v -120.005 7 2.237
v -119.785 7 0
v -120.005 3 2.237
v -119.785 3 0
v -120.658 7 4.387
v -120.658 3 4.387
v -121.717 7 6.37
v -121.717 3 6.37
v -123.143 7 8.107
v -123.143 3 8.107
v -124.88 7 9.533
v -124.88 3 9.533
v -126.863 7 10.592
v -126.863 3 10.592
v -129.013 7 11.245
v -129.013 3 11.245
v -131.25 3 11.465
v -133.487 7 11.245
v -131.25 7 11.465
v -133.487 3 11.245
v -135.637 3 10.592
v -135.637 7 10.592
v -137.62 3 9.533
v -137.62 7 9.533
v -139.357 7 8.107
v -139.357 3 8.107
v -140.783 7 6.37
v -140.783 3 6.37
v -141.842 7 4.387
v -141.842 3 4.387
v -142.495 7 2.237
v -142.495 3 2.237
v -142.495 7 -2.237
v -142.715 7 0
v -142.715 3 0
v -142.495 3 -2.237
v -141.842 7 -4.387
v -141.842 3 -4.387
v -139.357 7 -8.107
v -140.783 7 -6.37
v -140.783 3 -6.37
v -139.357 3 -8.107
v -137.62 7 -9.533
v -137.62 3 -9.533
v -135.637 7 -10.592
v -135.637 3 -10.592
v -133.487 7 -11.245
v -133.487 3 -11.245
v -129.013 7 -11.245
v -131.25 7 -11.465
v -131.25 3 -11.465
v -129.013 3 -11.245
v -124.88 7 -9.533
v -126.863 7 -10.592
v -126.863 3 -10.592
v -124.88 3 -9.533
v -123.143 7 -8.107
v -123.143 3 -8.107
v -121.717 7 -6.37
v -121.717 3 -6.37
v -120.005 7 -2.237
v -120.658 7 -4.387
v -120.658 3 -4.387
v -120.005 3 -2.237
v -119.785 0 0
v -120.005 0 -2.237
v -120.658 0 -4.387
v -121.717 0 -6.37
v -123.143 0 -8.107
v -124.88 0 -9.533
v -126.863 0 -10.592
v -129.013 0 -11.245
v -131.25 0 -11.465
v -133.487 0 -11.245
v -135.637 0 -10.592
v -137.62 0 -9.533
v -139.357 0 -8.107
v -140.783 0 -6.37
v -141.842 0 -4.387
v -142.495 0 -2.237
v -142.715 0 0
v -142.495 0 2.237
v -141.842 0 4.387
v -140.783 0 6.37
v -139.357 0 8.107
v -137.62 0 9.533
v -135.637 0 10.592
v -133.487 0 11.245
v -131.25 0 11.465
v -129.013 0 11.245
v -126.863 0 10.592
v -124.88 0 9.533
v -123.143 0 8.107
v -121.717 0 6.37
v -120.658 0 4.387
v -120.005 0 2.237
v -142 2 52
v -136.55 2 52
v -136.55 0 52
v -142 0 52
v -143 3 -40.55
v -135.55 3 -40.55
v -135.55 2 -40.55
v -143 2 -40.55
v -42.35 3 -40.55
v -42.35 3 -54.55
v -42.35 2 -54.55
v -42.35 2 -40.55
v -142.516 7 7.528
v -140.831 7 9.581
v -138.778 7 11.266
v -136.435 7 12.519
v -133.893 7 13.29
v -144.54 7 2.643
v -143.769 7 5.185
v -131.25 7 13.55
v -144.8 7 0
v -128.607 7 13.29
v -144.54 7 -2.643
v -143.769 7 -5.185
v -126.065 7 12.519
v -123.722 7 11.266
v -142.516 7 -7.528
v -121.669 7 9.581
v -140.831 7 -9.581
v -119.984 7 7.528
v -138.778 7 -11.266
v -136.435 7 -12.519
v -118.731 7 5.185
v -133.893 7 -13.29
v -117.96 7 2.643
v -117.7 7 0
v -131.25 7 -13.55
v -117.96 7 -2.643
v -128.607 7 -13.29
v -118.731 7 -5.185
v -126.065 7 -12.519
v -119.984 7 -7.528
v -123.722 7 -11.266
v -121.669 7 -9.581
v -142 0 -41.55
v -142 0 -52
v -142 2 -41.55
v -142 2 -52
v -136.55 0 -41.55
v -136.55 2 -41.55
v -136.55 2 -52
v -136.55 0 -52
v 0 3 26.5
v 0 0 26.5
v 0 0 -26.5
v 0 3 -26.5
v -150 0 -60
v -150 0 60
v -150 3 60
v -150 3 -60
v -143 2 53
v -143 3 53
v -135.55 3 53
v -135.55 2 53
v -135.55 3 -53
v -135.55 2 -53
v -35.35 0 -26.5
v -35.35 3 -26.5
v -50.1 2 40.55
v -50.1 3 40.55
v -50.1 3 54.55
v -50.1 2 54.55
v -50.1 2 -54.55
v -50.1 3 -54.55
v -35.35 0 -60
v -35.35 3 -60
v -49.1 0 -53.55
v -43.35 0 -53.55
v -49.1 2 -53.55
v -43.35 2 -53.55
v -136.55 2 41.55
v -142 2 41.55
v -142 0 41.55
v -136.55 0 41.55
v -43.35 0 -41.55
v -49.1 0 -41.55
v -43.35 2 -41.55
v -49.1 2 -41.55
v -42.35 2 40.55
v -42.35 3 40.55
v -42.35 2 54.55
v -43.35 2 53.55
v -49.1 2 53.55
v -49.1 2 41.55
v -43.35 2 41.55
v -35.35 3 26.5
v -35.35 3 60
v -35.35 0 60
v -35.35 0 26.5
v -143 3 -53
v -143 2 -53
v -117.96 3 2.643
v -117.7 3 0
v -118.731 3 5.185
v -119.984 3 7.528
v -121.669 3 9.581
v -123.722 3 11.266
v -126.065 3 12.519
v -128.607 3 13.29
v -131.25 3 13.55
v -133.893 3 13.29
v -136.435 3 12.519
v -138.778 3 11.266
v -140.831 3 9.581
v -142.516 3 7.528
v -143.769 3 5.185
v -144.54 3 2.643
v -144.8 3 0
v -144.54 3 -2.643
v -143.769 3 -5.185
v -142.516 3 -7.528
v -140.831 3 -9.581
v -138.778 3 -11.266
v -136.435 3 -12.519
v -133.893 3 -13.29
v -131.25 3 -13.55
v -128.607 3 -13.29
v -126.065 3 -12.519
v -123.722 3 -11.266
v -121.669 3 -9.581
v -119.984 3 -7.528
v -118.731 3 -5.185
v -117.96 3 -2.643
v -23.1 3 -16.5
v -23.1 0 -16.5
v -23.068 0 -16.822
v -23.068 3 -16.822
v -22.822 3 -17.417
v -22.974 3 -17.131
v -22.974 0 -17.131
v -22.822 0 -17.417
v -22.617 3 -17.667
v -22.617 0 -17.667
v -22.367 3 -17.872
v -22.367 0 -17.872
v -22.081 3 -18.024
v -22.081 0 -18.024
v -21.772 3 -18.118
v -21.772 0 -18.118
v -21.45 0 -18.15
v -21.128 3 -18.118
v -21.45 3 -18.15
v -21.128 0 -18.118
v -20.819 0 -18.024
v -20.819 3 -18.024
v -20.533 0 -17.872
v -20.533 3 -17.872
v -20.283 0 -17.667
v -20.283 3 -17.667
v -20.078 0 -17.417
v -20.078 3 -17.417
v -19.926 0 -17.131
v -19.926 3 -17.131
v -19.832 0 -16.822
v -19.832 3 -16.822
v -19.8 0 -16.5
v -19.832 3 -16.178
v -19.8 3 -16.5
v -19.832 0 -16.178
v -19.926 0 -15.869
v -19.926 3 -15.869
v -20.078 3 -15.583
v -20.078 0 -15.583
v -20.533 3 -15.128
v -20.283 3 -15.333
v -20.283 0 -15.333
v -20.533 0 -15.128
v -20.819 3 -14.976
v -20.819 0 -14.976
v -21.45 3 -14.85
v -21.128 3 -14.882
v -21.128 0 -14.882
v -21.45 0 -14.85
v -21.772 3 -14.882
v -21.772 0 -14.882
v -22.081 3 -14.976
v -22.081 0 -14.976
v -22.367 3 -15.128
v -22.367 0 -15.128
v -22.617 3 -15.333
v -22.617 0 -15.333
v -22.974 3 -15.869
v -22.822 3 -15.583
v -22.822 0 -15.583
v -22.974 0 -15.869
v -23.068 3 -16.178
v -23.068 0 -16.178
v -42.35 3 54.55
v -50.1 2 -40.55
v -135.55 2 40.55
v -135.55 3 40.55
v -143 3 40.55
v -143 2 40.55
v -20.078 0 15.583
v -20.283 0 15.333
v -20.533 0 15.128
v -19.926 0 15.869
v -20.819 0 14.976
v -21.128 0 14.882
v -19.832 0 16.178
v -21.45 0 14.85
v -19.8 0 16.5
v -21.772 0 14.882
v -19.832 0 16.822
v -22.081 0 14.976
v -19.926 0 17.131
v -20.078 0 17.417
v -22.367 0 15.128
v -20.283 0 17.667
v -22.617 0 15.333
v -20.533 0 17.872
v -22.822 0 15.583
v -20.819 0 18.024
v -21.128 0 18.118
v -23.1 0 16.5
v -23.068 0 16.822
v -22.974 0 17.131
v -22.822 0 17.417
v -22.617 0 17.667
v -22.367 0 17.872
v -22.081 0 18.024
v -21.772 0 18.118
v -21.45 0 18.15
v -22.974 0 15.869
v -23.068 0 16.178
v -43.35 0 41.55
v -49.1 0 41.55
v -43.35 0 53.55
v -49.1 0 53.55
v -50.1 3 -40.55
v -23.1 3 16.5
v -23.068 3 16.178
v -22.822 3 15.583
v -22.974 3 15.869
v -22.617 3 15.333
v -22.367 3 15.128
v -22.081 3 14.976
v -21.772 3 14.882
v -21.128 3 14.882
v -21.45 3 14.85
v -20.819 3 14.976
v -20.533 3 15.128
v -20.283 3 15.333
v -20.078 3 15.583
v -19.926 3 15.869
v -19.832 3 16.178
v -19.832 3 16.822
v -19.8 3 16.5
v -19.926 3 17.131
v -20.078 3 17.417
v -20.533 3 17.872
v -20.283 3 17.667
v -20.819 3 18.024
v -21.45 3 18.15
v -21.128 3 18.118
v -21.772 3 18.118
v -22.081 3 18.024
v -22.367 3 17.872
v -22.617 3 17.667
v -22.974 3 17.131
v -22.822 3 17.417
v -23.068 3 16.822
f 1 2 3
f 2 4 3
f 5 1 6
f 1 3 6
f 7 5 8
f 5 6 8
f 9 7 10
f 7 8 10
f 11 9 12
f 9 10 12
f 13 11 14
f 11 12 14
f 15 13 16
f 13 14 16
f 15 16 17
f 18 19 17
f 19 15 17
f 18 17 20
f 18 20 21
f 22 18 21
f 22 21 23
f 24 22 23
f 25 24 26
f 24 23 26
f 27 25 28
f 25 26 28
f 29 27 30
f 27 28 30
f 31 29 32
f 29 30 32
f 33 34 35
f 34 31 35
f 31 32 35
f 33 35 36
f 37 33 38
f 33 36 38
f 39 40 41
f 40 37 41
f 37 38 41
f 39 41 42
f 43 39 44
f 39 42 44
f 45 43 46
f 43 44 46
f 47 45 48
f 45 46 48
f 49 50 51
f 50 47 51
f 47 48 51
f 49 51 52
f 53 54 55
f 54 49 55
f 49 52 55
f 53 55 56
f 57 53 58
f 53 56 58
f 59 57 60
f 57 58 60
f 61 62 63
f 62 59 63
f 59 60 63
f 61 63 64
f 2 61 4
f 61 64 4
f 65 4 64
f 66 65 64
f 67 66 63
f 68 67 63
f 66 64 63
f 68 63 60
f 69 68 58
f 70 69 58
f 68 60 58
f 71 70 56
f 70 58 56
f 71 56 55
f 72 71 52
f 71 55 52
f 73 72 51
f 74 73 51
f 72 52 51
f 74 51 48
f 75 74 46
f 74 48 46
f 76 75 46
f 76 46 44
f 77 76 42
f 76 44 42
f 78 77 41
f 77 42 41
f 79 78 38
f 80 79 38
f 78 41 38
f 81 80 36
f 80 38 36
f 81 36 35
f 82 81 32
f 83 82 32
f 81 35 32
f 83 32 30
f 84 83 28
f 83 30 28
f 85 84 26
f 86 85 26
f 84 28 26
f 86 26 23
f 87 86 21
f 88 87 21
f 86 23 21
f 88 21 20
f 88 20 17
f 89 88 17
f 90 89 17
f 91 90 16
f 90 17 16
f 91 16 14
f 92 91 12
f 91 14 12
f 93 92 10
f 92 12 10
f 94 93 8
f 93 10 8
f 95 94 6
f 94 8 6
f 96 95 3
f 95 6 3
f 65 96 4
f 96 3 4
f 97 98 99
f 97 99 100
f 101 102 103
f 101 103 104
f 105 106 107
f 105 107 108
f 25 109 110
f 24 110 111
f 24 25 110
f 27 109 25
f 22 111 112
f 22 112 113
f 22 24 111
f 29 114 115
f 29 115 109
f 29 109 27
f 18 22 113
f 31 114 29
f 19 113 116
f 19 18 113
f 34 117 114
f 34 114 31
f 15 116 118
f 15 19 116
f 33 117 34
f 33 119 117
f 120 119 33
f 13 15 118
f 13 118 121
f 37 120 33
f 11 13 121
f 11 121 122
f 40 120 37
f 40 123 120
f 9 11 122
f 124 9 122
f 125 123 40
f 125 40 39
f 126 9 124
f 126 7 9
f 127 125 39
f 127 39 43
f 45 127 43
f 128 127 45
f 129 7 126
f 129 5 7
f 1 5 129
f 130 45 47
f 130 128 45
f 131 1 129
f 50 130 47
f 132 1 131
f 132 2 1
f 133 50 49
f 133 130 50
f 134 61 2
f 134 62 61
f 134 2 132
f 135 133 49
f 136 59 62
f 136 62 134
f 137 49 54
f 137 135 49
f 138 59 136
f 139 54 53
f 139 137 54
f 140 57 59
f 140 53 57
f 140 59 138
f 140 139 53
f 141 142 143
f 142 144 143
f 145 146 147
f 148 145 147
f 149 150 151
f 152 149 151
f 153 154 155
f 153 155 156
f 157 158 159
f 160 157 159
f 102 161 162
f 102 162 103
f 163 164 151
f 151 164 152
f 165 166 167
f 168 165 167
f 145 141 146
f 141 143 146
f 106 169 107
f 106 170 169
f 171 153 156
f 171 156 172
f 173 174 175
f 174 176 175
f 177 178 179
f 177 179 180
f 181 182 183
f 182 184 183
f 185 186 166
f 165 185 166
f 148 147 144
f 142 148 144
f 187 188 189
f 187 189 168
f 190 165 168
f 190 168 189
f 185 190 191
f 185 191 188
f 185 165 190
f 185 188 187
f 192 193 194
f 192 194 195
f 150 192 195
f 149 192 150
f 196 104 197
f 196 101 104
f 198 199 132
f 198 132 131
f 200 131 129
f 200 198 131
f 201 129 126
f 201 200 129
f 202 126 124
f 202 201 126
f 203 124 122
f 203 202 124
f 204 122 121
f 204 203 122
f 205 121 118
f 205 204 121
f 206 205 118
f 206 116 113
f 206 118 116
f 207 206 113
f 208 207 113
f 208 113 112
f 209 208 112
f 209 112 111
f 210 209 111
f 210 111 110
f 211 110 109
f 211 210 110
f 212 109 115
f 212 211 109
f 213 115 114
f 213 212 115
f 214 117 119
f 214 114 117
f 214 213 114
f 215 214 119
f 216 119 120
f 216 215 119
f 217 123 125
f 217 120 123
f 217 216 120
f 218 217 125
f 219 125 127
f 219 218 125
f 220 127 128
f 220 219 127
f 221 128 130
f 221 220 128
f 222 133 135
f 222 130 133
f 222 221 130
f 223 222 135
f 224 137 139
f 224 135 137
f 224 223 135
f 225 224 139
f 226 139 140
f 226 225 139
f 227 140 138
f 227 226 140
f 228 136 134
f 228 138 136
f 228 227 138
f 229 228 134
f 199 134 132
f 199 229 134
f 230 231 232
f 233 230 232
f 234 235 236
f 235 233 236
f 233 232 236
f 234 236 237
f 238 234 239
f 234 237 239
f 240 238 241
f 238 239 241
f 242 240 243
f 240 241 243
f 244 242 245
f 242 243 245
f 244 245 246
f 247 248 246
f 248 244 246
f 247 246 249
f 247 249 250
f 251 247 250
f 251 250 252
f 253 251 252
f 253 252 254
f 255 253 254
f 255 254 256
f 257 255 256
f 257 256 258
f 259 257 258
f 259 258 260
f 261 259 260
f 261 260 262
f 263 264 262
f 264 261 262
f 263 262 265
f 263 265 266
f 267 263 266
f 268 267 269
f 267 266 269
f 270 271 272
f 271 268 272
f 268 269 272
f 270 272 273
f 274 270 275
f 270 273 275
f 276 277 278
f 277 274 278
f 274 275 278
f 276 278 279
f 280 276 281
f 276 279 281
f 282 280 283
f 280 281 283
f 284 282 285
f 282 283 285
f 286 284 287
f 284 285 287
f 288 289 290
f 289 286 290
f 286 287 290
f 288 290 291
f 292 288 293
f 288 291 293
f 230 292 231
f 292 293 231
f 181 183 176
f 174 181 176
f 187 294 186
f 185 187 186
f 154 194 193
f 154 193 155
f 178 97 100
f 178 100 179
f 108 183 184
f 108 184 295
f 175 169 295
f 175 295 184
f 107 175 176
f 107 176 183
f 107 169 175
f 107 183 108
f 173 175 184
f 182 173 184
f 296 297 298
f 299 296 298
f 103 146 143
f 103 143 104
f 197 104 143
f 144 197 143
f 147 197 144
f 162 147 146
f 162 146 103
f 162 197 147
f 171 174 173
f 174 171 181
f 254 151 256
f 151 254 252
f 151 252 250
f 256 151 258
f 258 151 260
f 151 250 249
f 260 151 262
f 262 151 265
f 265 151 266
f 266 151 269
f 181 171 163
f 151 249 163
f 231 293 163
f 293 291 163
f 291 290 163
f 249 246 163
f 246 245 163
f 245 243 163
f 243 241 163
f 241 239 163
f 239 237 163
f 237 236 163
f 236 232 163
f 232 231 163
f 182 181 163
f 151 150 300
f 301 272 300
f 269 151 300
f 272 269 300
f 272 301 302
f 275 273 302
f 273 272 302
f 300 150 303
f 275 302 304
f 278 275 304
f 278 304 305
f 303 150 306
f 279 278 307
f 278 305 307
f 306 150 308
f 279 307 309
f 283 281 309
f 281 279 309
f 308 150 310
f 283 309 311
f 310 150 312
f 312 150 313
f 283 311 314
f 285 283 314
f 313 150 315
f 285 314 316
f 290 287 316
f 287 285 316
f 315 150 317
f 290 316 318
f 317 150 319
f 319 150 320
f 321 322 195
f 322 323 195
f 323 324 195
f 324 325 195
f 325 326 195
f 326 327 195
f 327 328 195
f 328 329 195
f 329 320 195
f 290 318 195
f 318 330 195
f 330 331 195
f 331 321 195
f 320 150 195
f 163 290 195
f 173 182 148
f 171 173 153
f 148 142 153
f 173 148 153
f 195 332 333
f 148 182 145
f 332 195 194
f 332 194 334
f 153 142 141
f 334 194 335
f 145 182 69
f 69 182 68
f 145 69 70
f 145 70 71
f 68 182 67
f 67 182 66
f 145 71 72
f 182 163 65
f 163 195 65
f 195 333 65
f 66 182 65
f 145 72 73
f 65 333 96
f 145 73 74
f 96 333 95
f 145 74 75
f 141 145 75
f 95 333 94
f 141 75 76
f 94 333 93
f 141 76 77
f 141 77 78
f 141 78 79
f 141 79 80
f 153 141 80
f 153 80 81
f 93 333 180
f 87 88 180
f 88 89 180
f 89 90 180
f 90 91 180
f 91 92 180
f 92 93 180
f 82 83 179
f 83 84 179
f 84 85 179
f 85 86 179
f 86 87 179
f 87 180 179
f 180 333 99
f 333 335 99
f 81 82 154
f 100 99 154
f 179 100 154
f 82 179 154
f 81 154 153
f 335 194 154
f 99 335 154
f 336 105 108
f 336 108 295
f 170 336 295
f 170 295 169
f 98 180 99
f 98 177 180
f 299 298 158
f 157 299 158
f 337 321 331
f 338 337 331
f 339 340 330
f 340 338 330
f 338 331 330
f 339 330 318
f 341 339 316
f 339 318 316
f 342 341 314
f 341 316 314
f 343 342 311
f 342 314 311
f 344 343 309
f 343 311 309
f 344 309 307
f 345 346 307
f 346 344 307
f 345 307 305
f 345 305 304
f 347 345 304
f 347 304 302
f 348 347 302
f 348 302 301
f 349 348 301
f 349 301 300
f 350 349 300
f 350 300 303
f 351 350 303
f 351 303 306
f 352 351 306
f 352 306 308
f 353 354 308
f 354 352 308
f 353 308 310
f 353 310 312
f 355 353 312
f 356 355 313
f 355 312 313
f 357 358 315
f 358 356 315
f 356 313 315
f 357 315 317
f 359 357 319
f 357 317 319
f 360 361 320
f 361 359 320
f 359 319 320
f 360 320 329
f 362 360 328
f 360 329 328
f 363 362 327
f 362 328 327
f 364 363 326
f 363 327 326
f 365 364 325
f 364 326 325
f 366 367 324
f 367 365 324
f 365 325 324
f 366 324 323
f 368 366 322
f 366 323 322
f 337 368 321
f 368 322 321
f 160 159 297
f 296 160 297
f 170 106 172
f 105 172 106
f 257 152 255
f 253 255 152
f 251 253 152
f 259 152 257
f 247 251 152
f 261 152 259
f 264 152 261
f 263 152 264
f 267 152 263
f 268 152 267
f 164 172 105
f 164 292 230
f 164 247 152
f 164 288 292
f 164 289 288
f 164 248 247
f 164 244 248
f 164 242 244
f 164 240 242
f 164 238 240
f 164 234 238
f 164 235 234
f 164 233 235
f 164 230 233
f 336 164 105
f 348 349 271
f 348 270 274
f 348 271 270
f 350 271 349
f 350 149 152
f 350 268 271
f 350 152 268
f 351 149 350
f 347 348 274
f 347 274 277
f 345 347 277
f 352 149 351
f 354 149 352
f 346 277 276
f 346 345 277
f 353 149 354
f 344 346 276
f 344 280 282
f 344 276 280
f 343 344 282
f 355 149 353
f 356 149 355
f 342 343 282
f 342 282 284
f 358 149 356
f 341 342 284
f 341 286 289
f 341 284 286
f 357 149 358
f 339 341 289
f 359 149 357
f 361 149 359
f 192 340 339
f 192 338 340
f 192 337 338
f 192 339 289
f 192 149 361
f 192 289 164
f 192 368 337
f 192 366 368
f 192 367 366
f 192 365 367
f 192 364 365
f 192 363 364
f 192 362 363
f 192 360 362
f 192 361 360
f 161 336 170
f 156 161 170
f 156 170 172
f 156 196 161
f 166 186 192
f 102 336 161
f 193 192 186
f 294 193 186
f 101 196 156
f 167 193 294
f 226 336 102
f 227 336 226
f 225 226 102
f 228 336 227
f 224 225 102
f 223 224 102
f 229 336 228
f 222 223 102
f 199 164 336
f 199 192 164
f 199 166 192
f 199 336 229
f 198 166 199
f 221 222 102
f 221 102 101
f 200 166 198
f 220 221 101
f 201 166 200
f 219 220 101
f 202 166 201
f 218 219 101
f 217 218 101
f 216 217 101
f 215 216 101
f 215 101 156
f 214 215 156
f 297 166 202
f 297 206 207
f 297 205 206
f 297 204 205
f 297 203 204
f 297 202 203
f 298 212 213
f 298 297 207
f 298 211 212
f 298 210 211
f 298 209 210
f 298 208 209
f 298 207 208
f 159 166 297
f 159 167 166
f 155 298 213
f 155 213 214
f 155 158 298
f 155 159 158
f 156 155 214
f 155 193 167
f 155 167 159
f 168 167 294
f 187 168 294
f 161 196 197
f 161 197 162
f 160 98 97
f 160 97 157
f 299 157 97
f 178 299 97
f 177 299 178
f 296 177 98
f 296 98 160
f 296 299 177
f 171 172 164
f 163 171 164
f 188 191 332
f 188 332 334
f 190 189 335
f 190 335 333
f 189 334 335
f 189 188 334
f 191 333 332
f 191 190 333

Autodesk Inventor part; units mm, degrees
ref_plane "YZ Plane" through (0, 0, 0) normal (1, 0, 0) x (0, 1, 0)
ref_plane "XZ Plane" through (0, 0, 0) normal (0, 1, 0) x (-1, 0, 0)
ref_plane "XY Plane" through (0, 0, 0) normal (0, 0, 1) x (1, 0, 0)
sketch "Boceto1" plane through (0, 0, 0) normal (0, 1, 0) x (-1, 0, 0)
  line L0 (25.35, 26.5) -> (0, 26.5)
  line L1 (0, 26.5) -> (0, -26.5)
  line L2 (0, -26.5) -> (25.35, -26.5)
  line L3 (-8.9327, 0) -> (109.0416, 0) construction
  line L4 (25.35, 60) -> (150, 60)
  line L5 (150, 60) -> (150, -60)
  line L6 (150, -60) -> (25.35, -60)
  line L7 (25.35, -60) -> (25.35, -26.5)
  line L8 (25.35, 26.5) -> (25.35, 60)
  circle A0 centre (21.45, 16.5) radius 1.65
  circle A1 centre (21.45, -16.5) radius 1.65
  point P0 (0, 0)
  point P1 (0, 0)
  dimension "d1" = 53
  dimension "d2" = 120
  dimension "d3" = 124.65
  dimension "d4" = 25.35
  dimension "d6" = 33.5
  dimension "d8" = 3.3
  dimension "d9" = 16.5
  dimension "d10" = 3.9
extrude "Extrusión1" add sketch "Boceto1" along normal blind 3
sketch "Boceto2" plane through (0, 3, 0) normal (0, 1, 0) x (1, 0, 0)
  line L0 (-150, 60) -> (-150, -60) projected
  line L1 (-25.35, 60) -> (-150, 60) projected
  line L2 (-150, -60) -> (-25.35, -60)
  line L3 (-25.35, -60) -> (-25.35, 60)
  line L4 (-25.35, 60) -> (-150, 60)
  line L5 (-150, 60) -> (-150, -60)
  line L6 (-30.35, -55) -> (-145, -55)
  line L7 (-145, -55) -> (-145, 55)
  line L8 (-145, 55) -> (-30.35, 55)
  line L9 (-30.35, 55) -> (-30.35, -55)
  circle A0 centre (-131.25, 0) radius 11.465
  circle A1 centre (-131.25, 0) radius 13.55
  point P0 (0, 0)
  dimension "d13" = 5
  dimension "d14" = 22.93
  dimension "d15" = 13.75
  dimension "d16" = 27.1
extrude "Extrusión2" cut sketch "Boceto2" against normal through all contours A0
extrude "Extrusión3" add sketch "Boceto2" along normal blind 4 contours A1
sketch "Boceto3" plane through (0, 3, 0) normal (0, 1, 0) x (1, 0, 0)
  line L0 (-25.35, 26.5) -> (-25.35, 60) projected
  line L1 (-25.35, 60) -> (-35.35, 60)
  line L2 (-35.35, 60) -> (-35.35, 26.5)
  line L3 (-35.35, 26.5) -> (-25.35, 26.5)
  line L4 (-25.35, 26.5) -> (-25.35, 60)
  line L5 (-25.35, -60) -> (-25.35, -26.5) projected
  line L6 (-25.35, -60) -> (-35.35, -60)
  line L7 (-35.35, -60) -> (-35.35, -26.5)
  line L8 (-35.35, -26.5) -> (-25.35, -26.5)
  line L9 (-25.35, -26.5) -> (-25.35, -60)
  point P0 (-150, 60)
  dimension "d46" = 10
  dimension "d47" = 10
  dimension "d48" = 33.5
  dimension "d49" = 33.5
extrude "Extrusión7" cut sketch "Boceto3" against normal through all
sketch "Boceto4" plane through (0, 3, 0) normal (0, 1, 0) x (1, 0, 0)
  line L0 (-143, 53) -> (-135.55, 53)
  line L1 (-135.55, 53) -> (-135.55, 40.55)
  line L2 (-135.55, 40.55) -> (-143, 40.55)
  line L3 (-143, 40.55) -> (-143, 53)
  line L4 (-136.55, 52) -> (-142, 52)
  line L5 (-142, 52) -> (-142, 41.55)
  line L6 (-142, 41.55) -> (-136.55, 41.55)
  line L7 (-136.55, 41.55) -> (-136.55, 52)
  line L8 (-50.1, 54.55) -> (-42.35, 54.55)
  line L9 (-42.35, 54.55) -> (-42.35, 40.55)
  line L10 (-42.35, 40.55) -> (-50.1, 40.55)
  line L11 (-50.1, 40.55) -> (-50.1, 54.55)
  line L12 (-43.35, 53.55) -> (-49.1, 53.55)
  line L13 (-49.1, 53.55) -> (-49.1, 41.55)
  line L14 (-49.1, 41.55) -> (-43.35, 41.55)
  line L15 (-43.35, 41.55) -> (-43.35, 53.55)
  line L16 (-35.35, 60) -> (-150, 60) construction
  line L17 (-35.35, -26.5) -> (-35.35, -60) construction
  line L18 (-150, 60) -> (-35.35, 60) construction
  line L19 (-35.35, 60) -> (-35.35, -60) construction
  line L20 (-35.35, -60) -> (-150, -60) construction
  line L21 (-150, -60) -> (-150, 60) construction
  line L22 (-147, 57) -> (-38.35, 57) construction
  line L23 (-38.35, 57) -> (-38.35, -57) construction
  line L24 (-38.35, -57) -> (-147, -57) construction
  line L25 (-147, -57) -> (-147, 57) construction
  line L26 (-150, 0) -> (0, 0) construction
  line L27 (-50.1, -40.55) -> (-50.1, -54.55)
  line L28 (-136.55, -41.55) -> (-136.55, -52)
  line L29 (-135.55, -53) -> (-135.55, -40.55)
  line L30 (-136.55, -52) -> (-142, -52)
  line L31 (-142, -52) -> (-142, -41.55)
  line L32 (-142, -41.55) -> (-136.55, -41.55)
  line L33 (-143, -53) -> (-135.55, -53)
  line L34 (-135.55, -40.55) -> (-143, -40.55)
  line L35 (-143, -40.55) -> (-143, -53)
  line L36 (-42.35, -40.55) -> (-50.1, -40.55)
  line L37 (-42.35, -54.55) -> (-42.35, -40.55)
  line L38 (-50.1, -54.55) -> (-42.35, -54.55)
  line L39 (-43.35, -53.55) -> (-49.1, -53.55)
  line L40 (-49.1, -53.55) -> (-49.1, -41.55)
  line L41 (-49.1, -41.55) -> (-43.35, -41.55)
  line L42 (-43.35, -41.55) -> (-43.35, -53.55)
  point P0 (-46.225, 40.55)
  point P1 (-139.275, 40.55)
  point P2 (-46.225, -40.55)
  point P3 (-139.275, -40.55)
  dimension "d52" = 7.45
  dimension "d53" = 12.45
  dimension "d54" = 1
  dimension "d55" = 14
  dimension "d56" = 7.75
  dimension "d57" = 1
  dimension "d59" = 3
  dimension "d60" = 4
  dimension "d61" = 4
  dimension "d62" = 4
extrude "Extrusión8" cut sketch "Boceto4" against normal blind 1
extrude "Extrusión9" cut sketch "Boceto4" against normal through all contours L7 L6 L5 L4 | L15 L14 L13 L12 | L28 L30 L31 L32 | L39 L40 L41 L42
properties part number "Base V.2"
